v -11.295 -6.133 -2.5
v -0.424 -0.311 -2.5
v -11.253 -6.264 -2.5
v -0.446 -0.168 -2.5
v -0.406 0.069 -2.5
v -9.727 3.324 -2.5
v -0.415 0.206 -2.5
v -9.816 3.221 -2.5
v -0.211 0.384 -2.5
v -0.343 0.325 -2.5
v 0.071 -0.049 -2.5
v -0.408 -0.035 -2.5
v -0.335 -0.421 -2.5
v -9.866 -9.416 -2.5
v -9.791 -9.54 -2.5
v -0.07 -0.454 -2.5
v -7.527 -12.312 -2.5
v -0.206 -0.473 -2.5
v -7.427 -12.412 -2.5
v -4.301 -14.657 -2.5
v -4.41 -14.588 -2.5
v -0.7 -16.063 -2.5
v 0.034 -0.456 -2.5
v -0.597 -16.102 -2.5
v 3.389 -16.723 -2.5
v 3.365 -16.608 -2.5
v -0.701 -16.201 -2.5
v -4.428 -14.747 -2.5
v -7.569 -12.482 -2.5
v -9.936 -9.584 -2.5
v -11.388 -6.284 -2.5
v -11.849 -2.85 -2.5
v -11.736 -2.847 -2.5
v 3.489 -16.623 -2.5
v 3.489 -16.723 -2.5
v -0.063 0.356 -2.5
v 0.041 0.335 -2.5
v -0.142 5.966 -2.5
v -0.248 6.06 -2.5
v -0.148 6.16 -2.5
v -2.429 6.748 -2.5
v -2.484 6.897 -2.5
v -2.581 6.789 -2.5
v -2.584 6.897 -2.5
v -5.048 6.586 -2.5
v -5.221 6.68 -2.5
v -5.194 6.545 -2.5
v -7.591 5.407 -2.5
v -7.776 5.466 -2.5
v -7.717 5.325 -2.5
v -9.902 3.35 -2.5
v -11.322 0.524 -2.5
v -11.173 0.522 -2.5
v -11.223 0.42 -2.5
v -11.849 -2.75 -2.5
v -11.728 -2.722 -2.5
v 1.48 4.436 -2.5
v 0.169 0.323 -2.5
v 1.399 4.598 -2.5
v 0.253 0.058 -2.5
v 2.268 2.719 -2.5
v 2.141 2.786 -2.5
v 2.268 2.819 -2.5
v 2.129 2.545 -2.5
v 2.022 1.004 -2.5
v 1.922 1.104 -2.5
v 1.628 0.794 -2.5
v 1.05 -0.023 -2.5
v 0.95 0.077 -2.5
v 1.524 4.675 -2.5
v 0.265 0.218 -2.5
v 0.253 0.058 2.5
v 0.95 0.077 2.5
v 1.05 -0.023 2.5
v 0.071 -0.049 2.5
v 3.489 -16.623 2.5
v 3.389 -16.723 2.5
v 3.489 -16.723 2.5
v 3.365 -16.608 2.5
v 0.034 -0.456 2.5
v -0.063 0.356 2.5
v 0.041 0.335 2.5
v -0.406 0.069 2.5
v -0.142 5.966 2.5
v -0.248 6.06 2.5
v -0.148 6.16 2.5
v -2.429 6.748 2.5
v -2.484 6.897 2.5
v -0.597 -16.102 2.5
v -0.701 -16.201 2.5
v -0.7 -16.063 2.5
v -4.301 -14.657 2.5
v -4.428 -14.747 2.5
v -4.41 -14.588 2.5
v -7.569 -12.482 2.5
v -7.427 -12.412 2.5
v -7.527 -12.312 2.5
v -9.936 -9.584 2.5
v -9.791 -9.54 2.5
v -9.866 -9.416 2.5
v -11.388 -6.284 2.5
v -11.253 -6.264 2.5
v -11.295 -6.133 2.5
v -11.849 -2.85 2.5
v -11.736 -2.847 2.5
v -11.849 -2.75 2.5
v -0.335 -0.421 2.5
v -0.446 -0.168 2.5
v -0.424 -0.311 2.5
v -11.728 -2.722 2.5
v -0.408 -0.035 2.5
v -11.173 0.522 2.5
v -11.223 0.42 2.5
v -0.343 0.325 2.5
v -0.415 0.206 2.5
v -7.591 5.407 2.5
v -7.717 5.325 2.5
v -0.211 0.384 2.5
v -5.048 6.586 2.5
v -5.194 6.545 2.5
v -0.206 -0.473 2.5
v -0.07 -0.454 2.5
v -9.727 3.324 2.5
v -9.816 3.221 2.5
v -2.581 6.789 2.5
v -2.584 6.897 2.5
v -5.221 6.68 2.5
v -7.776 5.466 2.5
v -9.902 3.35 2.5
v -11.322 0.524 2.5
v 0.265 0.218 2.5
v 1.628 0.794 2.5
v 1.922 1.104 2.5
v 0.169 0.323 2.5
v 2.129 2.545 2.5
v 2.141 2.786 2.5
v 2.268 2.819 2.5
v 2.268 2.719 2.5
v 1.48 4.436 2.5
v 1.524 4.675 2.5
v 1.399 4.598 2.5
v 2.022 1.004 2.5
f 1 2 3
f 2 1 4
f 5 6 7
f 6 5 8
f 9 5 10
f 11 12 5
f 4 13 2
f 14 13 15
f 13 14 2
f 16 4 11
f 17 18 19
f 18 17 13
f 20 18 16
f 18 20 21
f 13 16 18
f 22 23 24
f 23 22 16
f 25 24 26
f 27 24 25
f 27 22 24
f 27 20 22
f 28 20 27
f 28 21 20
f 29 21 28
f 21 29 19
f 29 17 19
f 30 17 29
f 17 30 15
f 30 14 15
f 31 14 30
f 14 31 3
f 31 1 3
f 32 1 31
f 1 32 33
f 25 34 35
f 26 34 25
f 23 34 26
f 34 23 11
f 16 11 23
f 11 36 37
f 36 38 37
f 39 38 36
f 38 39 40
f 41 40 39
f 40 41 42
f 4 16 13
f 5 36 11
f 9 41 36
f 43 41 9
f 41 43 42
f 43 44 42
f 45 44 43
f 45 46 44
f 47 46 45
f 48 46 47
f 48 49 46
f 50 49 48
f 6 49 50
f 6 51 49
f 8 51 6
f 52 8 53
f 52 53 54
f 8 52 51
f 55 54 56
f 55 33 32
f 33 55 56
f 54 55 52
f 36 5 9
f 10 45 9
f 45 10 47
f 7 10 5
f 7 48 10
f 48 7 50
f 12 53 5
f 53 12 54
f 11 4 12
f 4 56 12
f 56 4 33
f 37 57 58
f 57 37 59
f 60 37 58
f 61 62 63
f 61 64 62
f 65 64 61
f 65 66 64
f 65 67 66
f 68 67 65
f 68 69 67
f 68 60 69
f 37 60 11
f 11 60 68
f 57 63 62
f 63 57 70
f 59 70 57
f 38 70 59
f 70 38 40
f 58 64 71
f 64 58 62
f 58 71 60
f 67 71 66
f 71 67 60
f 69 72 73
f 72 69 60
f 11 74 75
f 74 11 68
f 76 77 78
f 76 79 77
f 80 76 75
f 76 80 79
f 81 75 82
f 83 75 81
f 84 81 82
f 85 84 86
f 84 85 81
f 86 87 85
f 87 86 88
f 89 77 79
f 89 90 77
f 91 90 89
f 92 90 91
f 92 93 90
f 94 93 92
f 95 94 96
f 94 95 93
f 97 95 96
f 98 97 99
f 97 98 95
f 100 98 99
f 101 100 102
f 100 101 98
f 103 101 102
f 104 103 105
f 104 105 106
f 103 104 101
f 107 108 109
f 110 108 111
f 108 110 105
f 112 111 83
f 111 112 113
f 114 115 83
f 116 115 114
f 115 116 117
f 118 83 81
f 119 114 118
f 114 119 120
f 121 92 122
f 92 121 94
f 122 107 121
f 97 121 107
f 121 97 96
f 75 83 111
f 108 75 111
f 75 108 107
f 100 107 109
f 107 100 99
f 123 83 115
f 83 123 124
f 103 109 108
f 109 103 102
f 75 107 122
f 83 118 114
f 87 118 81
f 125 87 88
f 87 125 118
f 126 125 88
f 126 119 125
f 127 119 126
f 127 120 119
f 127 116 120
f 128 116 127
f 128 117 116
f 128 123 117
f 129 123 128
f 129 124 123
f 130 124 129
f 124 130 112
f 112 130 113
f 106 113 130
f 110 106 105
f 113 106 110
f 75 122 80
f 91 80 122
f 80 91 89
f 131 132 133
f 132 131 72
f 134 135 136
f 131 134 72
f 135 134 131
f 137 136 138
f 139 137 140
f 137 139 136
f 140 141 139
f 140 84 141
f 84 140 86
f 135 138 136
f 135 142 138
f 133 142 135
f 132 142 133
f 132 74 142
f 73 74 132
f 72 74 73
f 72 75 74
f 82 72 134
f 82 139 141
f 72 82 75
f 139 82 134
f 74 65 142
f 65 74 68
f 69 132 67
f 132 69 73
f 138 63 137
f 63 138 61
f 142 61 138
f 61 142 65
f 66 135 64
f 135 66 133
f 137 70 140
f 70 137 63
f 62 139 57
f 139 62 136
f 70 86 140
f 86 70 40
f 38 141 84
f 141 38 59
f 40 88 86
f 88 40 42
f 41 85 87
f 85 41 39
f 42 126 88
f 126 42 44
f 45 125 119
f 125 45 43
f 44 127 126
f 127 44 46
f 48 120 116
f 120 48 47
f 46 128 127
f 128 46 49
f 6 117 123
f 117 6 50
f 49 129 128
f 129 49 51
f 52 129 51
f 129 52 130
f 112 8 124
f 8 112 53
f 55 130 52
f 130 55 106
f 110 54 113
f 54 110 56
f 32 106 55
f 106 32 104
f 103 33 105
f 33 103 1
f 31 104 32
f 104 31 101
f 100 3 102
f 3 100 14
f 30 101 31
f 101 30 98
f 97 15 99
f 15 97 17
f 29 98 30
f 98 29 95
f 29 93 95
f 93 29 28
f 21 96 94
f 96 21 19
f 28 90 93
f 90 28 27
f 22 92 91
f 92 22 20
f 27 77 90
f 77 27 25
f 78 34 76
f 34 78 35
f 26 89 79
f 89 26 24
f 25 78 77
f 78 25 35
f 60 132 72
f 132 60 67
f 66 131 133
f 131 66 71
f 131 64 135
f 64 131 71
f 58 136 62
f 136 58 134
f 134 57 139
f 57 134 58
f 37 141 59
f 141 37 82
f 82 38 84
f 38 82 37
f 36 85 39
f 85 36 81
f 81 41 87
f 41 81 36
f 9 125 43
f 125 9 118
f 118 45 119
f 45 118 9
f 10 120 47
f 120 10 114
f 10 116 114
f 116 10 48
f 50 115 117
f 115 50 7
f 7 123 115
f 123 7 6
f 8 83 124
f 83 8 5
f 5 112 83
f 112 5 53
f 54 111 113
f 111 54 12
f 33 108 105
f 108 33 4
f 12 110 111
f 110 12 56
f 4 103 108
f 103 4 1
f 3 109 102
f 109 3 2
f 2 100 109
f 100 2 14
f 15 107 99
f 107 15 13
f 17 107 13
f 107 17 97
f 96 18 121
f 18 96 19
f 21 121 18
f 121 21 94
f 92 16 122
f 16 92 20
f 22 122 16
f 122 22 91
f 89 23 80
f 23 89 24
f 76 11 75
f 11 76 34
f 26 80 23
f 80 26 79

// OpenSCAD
n = 17;       
height = 5;       
line_width = 0.1; 
function theta_sum(k) = k == 1 ? PI/2 : PI/2 + sum([for (j = [1:k-1]) atan(1/sqrt(j))]);
function sum(v, i = 0, r = 0) = i < len(v) ? sum(v, i + 1, r + v[i]) : r;
points = [for (k = [0:n]) 
    k == 0 ? [0, 0] : [
        sum([for (j = [1:k]) cos(theta_sum(j)) * sqrt(j)]),
        sum([for (j = [1:k]) sin(theta_sum(j)) * sqrt(j)])
    ]
];
module line_segment(p1, p2) {
    hull() {
        translate([p1[0], p1[1], 0]) cube([line_width, line_width, height], center=true);
        translate([p2[0], p2[1], 0]) cube([line_width, line_width, height], center=true);
    }
}
color("white")
for (i = [0:n-1]) {
    line_segment(points[i], points[i+1]);
}
color([1, 1, 0.4])
for (i = [1:n]) {
    line_segment([0, 0], points[i]);
}
